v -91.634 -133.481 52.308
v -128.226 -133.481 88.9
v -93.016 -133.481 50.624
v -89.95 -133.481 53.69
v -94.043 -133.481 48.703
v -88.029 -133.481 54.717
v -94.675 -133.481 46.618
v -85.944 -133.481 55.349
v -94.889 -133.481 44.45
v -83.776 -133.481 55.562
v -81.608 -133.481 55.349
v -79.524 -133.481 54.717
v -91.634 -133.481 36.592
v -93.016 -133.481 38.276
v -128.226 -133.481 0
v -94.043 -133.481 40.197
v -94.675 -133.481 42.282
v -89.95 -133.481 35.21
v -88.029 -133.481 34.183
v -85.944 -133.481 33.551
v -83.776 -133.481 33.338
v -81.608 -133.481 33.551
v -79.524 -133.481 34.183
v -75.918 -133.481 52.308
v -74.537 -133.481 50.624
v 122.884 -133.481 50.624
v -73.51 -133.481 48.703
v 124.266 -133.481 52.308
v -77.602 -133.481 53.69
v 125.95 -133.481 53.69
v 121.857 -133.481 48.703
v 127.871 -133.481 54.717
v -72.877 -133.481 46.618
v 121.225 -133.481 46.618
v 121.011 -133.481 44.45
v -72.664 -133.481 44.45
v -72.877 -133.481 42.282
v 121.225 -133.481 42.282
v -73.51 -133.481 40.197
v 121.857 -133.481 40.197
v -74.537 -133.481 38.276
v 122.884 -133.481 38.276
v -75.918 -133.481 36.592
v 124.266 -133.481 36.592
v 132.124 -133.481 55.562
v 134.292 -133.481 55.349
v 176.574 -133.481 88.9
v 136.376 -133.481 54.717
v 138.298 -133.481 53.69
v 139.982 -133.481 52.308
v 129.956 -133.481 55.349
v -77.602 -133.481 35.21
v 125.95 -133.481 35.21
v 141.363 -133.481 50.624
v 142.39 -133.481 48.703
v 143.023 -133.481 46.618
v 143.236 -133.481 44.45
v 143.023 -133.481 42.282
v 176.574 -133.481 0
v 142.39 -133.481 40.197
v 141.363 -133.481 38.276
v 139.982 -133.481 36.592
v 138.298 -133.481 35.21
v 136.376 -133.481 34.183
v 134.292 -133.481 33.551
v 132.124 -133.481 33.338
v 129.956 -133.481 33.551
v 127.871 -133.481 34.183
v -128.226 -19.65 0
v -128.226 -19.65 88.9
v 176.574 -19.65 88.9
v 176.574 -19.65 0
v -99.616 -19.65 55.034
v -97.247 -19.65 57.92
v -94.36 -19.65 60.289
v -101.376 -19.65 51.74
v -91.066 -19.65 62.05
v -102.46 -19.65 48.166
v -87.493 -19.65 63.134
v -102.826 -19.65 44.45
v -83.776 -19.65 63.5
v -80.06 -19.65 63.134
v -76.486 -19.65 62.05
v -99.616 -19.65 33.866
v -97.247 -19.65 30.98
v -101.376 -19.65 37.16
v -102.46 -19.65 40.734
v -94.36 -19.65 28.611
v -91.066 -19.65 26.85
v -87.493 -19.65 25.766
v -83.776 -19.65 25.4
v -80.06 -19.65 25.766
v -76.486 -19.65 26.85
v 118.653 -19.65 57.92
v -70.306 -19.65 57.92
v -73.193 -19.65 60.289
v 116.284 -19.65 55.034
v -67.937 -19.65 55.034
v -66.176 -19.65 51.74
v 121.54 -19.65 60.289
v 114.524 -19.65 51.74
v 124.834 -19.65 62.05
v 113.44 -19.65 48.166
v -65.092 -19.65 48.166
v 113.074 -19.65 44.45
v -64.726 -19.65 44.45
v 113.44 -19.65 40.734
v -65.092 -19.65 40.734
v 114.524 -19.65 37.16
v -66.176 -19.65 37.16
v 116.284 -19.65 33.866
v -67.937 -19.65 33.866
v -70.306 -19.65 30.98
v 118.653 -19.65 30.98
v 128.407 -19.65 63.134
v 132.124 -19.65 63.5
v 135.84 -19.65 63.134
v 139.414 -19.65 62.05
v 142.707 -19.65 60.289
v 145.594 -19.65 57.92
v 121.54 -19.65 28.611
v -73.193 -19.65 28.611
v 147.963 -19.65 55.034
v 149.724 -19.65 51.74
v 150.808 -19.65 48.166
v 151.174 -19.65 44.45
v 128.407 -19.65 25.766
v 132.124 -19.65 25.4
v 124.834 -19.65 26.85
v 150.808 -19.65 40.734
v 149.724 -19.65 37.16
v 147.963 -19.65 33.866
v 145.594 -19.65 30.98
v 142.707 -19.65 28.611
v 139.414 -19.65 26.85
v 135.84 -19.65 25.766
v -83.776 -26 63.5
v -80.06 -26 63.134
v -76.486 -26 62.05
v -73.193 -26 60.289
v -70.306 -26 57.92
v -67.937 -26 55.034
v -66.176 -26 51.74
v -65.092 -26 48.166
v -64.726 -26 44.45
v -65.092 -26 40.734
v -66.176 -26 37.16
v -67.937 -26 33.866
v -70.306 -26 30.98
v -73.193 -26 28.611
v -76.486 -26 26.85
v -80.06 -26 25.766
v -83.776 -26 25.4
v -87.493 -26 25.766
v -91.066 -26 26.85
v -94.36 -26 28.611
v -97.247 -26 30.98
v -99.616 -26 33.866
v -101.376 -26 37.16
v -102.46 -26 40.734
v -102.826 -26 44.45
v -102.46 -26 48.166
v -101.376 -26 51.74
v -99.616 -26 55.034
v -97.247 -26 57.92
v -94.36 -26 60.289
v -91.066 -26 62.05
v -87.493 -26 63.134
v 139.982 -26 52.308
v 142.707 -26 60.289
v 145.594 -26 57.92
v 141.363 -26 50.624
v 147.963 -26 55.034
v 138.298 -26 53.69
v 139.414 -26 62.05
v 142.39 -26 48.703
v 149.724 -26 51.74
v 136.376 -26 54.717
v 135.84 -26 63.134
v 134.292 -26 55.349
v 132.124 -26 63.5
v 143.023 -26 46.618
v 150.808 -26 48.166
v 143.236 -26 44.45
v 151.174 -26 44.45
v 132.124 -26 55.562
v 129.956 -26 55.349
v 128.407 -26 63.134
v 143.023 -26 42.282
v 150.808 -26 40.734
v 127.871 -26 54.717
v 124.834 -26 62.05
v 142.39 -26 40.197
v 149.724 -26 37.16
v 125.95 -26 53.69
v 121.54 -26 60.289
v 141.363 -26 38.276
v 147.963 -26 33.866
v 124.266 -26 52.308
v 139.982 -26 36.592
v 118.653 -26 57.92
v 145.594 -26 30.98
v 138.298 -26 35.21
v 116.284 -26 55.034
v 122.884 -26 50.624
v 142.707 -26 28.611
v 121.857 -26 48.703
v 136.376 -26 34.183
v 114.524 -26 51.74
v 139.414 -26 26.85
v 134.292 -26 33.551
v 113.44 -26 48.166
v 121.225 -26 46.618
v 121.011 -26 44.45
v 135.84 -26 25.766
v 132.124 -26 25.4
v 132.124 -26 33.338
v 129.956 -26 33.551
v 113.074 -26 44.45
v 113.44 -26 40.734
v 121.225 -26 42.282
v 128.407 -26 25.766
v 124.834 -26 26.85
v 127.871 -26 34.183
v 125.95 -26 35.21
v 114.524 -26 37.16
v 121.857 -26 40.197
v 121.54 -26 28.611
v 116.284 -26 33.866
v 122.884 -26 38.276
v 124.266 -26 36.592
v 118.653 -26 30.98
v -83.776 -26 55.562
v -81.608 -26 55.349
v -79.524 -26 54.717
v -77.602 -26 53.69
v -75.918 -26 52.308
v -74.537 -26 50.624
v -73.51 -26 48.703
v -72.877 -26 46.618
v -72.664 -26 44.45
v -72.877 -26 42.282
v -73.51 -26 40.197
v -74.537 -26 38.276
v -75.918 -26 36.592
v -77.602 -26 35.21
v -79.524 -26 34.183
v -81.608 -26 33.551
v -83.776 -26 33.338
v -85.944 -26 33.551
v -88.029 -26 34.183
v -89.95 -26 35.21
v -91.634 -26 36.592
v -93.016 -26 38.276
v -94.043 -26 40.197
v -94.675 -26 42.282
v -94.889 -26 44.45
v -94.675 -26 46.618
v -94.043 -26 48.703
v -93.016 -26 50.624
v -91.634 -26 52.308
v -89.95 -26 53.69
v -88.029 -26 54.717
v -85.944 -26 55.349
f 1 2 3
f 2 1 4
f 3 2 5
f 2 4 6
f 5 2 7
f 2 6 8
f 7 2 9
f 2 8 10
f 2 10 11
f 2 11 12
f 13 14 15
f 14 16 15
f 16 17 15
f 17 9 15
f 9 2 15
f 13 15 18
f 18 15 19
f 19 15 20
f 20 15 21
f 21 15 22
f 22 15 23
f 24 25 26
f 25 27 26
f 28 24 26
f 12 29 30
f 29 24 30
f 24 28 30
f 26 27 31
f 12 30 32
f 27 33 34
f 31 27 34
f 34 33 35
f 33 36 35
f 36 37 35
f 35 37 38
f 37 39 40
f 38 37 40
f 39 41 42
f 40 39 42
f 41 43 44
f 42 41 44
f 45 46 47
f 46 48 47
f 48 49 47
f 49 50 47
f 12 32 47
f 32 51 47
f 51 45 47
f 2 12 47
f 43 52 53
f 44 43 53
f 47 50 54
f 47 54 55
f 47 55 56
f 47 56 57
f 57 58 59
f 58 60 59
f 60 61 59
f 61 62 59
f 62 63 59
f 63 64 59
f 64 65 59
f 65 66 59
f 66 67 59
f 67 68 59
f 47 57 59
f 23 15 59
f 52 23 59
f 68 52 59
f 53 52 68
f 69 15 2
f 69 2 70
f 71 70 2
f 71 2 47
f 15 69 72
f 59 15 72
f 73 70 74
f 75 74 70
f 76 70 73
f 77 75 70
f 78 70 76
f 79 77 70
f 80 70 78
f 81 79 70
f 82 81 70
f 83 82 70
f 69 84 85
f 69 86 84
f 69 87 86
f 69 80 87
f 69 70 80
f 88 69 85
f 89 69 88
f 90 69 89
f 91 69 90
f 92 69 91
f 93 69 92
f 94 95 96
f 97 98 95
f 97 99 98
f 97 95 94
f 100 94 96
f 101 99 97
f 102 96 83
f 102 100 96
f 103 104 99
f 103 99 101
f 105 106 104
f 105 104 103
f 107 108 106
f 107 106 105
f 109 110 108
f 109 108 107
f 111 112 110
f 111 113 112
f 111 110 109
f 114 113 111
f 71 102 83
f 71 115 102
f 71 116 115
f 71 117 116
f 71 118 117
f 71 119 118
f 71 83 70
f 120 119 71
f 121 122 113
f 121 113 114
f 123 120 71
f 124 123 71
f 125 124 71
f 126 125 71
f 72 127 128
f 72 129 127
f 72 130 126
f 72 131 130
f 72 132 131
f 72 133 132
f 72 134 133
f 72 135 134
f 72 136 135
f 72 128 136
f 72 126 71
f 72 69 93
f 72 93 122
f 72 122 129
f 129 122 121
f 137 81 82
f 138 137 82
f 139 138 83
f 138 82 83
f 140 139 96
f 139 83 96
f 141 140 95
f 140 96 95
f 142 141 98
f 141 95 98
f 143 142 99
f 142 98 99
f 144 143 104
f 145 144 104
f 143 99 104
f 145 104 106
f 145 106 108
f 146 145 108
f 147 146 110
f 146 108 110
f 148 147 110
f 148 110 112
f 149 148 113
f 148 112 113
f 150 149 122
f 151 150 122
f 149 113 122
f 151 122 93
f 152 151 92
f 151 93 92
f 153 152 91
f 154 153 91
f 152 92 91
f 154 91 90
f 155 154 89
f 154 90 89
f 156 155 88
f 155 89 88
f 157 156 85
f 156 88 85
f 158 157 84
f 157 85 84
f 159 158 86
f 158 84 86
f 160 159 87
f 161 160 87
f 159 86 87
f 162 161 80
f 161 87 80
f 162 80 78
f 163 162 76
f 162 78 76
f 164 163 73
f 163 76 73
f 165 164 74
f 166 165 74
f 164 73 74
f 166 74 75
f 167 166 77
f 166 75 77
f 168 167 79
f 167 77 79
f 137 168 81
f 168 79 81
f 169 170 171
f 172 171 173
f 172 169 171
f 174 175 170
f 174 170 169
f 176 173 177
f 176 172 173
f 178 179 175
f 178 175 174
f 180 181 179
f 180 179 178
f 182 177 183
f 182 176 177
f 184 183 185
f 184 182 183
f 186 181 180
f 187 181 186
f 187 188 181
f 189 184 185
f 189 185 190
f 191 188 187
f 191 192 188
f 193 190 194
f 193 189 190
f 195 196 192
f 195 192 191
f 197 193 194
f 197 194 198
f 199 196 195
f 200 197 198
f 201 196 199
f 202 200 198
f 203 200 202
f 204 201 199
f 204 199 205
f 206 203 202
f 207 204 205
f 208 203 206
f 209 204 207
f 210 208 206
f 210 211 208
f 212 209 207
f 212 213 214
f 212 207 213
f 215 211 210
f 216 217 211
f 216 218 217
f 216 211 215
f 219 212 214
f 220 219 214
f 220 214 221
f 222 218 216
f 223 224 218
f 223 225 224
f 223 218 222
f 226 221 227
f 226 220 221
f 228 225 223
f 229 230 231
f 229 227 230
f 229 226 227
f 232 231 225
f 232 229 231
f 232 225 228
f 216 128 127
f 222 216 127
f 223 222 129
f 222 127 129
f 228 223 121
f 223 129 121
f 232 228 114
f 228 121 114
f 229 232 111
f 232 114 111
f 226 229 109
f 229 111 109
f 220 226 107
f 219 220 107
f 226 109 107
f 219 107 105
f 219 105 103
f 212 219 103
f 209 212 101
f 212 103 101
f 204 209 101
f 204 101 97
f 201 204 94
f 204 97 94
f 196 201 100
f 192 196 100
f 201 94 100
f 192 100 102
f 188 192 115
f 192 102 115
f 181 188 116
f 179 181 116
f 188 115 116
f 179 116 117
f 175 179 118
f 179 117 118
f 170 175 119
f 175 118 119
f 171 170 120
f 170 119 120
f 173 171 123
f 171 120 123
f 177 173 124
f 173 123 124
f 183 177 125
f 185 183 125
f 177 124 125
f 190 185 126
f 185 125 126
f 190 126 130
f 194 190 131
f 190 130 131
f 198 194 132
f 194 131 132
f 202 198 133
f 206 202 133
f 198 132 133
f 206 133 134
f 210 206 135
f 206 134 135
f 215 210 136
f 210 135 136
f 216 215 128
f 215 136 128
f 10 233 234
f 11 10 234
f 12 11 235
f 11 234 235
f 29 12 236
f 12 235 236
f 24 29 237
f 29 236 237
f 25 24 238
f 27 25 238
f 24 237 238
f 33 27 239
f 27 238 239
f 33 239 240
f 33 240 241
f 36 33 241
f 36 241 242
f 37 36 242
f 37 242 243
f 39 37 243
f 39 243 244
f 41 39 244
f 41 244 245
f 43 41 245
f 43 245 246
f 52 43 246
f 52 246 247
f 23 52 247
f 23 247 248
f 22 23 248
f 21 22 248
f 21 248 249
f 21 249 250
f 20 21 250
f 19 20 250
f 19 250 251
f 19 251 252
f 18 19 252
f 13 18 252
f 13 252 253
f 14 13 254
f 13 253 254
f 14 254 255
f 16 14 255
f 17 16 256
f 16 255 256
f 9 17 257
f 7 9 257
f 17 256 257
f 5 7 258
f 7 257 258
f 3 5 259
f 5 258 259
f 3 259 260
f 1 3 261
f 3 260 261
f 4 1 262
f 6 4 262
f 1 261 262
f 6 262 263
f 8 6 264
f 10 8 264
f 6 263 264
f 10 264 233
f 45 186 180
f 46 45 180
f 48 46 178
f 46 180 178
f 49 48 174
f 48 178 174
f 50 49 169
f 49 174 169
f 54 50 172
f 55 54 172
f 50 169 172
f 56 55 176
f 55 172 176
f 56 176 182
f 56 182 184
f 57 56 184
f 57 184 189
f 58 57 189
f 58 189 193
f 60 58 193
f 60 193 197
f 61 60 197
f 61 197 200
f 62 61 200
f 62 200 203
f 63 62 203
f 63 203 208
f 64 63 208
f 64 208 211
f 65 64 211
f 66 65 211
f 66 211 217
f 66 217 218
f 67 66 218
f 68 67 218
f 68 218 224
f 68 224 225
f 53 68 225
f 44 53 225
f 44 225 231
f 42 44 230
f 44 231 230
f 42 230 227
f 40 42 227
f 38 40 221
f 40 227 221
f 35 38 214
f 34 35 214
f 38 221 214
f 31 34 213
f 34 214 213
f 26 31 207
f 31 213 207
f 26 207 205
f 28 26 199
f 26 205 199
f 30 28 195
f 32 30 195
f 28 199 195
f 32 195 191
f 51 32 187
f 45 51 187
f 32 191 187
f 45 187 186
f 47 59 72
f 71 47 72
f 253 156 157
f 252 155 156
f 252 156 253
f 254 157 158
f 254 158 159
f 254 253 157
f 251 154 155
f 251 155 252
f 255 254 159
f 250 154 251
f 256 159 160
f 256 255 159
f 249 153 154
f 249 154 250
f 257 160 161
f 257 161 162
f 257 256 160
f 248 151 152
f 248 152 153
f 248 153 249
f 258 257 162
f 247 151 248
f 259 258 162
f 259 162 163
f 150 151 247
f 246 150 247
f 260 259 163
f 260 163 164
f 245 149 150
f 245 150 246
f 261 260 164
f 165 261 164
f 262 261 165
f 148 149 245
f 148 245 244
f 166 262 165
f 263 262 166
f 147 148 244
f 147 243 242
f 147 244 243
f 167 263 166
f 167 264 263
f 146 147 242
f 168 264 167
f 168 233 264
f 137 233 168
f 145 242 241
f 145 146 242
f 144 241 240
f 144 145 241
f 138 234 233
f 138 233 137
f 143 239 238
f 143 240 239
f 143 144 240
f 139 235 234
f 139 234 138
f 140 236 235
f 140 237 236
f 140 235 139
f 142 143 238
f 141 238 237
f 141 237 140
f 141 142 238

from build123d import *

# Parameters (mm, degrees)
SKETCH1_W           = 304.8
SKETCH1_H           = 113.830905863
BOSS_EXTRUDE1_DEPTH = 88.9
SKETCH2_R           = 19.05
CUT_EXTRUDE1_DEPTH  = 6.35
SKETCH3_R           = 11.1125
CUT_EXTRUDE2_DEPTH  = 226.019242591


with BuildPart() as part:
    # Sketch1 → Boss-Extrude1 (new body)
    with BuildSketch(Plane.XY):
        with Locations((24.173793103, -76.565926378)):
            Rectangle(SKETCH1_W, SKETCH1_H)
    extrude(amount=BOSS_EXTRUDE1_DEPTH)

    # Sketch2 → Cut-Extrude1 (cut)
    with BuildSketch(Plane(origin=(0, -19.650473447, 0), x_dir=(1, 0, 0), z_dir=(0, 1, 0))):
        with Locations(Location((-83.776206897, -44.45, 0), (0, 0, 270))):
            Circle(SKETCH2_R)
        with Locations(Location((132.123793103, -44.45, 0), (0, 0, 90))):
            Circle(SKETCH2_R)
    extrude(amount=-CUT_EXTRUDE1_DEPTH, mode=Mode.SUBTRACT)

    # Sketch3 → Cut-Extrude2 (cut, through all)
    with BuildSketch(Plane(origin=(0, -26.000473447, 0), x_dir=(1, 0, 0), z_dir=(0, 1, 0))):
        with Locations(Location((-83.776206897, -44.45, 0), (0, 0, 270))):
            Circle(SKETCH3_R)
        with Locations(Location((132.123793103, -44.45, 0), (0, 0, 270))):
            Circle(SKETCH3_R)
    extrude(amount=-CUT_EXTRUDE2_DEPTH, mode=Mode.SUBTRACT)


solid = part.part
